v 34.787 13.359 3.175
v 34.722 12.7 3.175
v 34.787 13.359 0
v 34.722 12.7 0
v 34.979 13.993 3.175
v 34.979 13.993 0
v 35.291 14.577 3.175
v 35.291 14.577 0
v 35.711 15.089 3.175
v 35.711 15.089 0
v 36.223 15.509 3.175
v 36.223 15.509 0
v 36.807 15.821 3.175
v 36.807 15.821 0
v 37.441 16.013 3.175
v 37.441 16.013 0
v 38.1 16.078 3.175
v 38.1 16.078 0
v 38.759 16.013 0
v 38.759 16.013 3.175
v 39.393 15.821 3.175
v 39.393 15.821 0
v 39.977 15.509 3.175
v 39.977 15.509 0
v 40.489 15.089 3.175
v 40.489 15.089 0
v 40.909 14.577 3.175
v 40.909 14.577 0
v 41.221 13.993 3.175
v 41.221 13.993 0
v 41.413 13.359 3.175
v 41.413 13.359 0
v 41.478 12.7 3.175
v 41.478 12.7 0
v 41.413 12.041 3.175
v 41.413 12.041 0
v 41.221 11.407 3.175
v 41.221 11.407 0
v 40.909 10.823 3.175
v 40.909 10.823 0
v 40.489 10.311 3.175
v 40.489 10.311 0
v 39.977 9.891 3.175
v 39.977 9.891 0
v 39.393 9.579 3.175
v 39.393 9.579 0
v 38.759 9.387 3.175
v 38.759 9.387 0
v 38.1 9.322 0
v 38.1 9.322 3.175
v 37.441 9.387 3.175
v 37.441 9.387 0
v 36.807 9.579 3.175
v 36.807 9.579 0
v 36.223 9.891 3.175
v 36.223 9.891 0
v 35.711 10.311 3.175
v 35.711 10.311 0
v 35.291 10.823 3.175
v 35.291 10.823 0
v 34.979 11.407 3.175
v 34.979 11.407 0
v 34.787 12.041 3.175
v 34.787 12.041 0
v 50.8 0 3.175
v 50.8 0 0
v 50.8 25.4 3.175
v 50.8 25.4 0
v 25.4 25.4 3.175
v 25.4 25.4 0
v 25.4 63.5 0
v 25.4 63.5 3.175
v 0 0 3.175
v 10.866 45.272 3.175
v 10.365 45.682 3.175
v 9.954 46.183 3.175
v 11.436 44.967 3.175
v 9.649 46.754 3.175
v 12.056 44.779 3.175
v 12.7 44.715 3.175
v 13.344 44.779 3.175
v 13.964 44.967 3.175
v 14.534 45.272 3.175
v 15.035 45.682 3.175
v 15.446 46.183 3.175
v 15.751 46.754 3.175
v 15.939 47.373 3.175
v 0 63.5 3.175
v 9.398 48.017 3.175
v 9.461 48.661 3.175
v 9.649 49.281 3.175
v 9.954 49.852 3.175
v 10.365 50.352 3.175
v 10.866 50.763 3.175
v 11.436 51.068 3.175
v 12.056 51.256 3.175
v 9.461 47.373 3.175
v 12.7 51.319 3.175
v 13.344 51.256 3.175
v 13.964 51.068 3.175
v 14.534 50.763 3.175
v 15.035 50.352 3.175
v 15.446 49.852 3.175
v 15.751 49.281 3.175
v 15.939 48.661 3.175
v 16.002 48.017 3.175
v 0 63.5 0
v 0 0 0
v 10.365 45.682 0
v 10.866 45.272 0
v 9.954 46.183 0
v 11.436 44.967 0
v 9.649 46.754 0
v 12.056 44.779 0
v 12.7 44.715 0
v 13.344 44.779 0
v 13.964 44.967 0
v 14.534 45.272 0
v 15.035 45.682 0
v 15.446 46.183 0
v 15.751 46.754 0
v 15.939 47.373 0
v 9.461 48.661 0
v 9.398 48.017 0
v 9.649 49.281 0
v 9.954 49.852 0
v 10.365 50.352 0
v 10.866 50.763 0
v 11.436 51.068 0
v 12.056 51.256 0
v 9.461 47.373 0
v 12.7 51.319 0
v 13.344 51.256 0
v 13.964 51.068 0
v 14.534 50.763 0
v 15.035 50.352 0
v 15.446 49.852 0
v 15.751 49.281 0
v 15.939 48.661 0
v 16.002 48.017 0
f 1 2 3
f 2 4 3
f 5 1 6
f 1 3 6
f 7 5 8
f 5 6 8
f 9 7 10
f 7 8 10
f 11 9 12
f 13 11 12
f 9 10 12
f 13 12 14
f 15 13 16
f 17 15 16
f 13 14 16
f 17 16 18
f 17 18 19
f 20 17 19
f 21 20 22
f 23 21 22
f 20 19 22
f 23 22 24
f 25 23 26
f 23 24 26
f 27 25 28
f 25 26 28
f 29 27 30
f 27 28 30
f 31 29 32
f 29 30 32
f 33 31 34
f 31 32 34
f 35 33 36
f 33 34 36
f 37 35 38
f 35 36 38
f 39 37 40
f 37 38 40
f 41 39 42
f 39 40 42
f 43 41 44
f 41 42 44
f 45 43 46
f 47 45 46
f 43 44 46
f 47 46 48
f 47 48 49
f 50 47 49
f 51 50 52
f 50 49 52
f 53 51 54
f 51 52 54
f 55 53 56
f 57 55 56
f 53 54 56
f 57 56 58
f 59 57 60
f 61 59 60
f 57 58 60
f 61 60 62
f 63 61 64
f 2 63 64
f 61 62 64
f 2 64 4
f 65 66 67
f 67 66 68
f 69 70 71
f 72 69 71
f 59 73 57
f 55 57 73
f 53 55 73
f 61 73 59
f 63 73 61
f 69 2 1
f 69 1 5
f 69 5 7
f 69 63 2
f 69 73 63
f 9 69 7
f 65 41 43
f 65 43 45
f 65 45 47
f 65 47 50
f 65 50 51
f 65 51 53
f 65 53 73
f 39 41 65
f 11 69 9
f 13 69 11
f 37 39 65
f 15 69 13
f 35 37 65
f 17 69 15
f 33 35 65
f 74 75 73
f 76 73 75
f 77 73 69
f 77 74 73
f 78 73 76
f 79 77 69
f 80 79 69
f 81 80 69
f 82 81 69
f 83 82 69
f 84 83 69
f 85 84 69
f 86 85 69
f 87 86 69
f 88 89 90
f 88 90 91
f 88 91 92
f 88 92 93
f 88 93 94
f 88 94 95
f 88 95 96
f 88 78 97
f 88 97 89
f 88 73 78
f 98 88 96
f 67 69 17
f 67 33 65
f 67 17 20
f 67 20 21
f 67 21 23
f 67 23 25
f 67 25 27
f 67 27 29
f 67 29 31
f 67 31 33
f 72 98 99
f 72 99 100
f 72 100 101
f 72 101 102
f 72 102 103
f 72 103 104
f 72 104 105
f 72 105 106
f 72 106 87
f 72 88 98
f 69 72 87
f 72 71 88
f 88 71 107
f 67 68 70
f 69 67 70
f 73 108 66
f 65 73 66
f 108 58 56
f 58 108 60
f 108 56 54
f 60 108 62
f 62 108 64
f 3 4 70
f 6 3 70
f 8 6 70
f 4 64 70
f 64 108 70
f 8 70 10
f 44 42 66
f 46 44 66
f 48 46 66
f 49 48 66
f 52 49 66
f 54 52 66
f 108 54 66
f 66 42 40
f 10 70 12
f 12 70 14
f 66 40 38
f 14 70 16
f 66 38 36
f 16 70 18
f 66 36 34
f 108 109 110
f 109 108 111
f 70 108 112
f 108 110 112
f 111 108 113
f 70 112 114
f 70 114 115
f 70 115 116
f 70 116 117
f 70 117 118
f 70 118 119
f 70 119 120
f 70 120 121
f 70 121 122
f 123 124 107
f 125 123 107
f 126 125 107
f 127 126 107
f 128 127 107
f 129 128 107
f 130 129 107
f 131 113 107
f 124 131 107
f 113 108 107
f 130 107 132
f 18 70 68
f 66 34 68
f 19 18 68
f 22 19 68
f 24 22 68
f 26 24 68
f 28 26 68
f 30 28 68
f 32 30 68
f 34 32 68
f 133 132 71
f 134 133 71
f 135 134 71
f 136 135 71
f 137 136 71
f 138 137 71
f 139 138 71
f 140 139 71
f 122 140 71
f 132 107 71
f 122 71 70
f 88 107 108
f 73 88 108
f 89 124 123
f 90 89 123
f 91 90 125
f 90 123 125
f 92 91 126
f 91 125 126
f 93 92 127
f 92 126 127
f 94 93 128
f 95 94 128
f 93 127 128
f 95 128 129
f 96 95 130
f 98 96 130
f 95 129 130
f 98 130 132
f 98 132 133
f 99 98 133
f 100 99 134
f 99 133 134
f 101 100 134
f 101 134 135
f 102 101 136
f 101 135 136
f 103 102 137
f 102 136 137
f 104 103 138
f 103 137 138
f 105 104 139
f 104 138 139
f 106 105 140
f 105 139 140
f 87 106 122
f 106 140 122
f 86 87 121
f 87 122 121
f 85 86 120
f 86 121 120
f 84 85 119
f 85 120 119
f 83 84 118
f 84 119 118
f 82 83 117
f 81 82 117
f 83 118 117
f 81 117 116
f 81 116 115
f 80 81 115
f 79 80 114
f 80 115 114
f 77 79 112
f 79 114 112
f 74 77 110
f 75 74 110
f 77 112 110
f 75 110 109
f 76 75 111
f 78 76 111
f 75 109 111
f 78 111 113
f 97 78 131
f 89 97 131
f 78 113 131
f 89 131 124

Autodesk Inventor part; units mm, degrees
ref_plane "YZ Plane" through (0, 0, 0) normal (1, 0, 0) x (0, 1, 0)
ref_plane "XZ Plane" through (0, 0, 0) normal (0, 1, 0) x (-1, 0, 0)
ref_plane "XY Plane" through (0, 0, 0) normal (0, 0, 1) x (1, 0, 0)
sketch "Sketch1" plane through (0, 0, 0) normal (0, 0, 1) x (1, 0, 0)
  line L0 (0, 0) -> (50.8, 0)
  line L1 (50.8, 0) -> (50.8, 25.4)
  line L2 (50.8, 25.4) -> (25.4, 25.4)
  line L3 (25.4, 25.4) -> (25.4, 63.5)
  line L4 (25.4, 63.5) -> (0, 63.5)
  line L5 (0, 63.5) -> (0, 0)
  dimension "d0" = 50.8
  dimension "d2" = 25.4
  dimension "d3" = 25.4
  dimension "d4" = 38.1
extrude "Extrusion1" add sketch "Sketch1" along normal blind 3.175
sketch "Sketch2" plane through (0, 0, 0) normal (0, 0, -1) x (-1, 0, 0)
  circle A0 centre (-38.1, 12.7) radius 3.3782 projected
  circle A1 centre (-12.7, 48.0173) radius 3.302 projected
  circle A2 centre (4.1663, 34.7761) radius 4.4593 projected
sketch "Sketch3" plane through (0, 0, 0) normal (0, 0, -1) x (-1, 0, 0)
  line L0 (0, 0) -> (-50.8, 0) projected
  line L1 (0, 63.5) -> (0, 0) projected
  line L2 (-25.4, 63.5) -> (0, 63.5) projected
  line L3 (-25.4, 25.4) -> (-25.4, 63.5) projected
  line L4 (-50.8, 25.4) -> (-25.4, 25.4) projected
  line L5 (-50.8, 0) -> (-50.8, 25.4) projected
  circle A0 centre (-38.1, 12.7) radius 3.3782 projected
  line L6 (-22.225, 38.6193) -> (-22.225, 32.0153) projected
  circle A1 centre (-38.1, 12.7) radius 3.3782 projected
extrude "Extrusion2" cut sketch "Sketch2" against normal blind 25.4 contours A0 | A1
properties part number "ninja"
